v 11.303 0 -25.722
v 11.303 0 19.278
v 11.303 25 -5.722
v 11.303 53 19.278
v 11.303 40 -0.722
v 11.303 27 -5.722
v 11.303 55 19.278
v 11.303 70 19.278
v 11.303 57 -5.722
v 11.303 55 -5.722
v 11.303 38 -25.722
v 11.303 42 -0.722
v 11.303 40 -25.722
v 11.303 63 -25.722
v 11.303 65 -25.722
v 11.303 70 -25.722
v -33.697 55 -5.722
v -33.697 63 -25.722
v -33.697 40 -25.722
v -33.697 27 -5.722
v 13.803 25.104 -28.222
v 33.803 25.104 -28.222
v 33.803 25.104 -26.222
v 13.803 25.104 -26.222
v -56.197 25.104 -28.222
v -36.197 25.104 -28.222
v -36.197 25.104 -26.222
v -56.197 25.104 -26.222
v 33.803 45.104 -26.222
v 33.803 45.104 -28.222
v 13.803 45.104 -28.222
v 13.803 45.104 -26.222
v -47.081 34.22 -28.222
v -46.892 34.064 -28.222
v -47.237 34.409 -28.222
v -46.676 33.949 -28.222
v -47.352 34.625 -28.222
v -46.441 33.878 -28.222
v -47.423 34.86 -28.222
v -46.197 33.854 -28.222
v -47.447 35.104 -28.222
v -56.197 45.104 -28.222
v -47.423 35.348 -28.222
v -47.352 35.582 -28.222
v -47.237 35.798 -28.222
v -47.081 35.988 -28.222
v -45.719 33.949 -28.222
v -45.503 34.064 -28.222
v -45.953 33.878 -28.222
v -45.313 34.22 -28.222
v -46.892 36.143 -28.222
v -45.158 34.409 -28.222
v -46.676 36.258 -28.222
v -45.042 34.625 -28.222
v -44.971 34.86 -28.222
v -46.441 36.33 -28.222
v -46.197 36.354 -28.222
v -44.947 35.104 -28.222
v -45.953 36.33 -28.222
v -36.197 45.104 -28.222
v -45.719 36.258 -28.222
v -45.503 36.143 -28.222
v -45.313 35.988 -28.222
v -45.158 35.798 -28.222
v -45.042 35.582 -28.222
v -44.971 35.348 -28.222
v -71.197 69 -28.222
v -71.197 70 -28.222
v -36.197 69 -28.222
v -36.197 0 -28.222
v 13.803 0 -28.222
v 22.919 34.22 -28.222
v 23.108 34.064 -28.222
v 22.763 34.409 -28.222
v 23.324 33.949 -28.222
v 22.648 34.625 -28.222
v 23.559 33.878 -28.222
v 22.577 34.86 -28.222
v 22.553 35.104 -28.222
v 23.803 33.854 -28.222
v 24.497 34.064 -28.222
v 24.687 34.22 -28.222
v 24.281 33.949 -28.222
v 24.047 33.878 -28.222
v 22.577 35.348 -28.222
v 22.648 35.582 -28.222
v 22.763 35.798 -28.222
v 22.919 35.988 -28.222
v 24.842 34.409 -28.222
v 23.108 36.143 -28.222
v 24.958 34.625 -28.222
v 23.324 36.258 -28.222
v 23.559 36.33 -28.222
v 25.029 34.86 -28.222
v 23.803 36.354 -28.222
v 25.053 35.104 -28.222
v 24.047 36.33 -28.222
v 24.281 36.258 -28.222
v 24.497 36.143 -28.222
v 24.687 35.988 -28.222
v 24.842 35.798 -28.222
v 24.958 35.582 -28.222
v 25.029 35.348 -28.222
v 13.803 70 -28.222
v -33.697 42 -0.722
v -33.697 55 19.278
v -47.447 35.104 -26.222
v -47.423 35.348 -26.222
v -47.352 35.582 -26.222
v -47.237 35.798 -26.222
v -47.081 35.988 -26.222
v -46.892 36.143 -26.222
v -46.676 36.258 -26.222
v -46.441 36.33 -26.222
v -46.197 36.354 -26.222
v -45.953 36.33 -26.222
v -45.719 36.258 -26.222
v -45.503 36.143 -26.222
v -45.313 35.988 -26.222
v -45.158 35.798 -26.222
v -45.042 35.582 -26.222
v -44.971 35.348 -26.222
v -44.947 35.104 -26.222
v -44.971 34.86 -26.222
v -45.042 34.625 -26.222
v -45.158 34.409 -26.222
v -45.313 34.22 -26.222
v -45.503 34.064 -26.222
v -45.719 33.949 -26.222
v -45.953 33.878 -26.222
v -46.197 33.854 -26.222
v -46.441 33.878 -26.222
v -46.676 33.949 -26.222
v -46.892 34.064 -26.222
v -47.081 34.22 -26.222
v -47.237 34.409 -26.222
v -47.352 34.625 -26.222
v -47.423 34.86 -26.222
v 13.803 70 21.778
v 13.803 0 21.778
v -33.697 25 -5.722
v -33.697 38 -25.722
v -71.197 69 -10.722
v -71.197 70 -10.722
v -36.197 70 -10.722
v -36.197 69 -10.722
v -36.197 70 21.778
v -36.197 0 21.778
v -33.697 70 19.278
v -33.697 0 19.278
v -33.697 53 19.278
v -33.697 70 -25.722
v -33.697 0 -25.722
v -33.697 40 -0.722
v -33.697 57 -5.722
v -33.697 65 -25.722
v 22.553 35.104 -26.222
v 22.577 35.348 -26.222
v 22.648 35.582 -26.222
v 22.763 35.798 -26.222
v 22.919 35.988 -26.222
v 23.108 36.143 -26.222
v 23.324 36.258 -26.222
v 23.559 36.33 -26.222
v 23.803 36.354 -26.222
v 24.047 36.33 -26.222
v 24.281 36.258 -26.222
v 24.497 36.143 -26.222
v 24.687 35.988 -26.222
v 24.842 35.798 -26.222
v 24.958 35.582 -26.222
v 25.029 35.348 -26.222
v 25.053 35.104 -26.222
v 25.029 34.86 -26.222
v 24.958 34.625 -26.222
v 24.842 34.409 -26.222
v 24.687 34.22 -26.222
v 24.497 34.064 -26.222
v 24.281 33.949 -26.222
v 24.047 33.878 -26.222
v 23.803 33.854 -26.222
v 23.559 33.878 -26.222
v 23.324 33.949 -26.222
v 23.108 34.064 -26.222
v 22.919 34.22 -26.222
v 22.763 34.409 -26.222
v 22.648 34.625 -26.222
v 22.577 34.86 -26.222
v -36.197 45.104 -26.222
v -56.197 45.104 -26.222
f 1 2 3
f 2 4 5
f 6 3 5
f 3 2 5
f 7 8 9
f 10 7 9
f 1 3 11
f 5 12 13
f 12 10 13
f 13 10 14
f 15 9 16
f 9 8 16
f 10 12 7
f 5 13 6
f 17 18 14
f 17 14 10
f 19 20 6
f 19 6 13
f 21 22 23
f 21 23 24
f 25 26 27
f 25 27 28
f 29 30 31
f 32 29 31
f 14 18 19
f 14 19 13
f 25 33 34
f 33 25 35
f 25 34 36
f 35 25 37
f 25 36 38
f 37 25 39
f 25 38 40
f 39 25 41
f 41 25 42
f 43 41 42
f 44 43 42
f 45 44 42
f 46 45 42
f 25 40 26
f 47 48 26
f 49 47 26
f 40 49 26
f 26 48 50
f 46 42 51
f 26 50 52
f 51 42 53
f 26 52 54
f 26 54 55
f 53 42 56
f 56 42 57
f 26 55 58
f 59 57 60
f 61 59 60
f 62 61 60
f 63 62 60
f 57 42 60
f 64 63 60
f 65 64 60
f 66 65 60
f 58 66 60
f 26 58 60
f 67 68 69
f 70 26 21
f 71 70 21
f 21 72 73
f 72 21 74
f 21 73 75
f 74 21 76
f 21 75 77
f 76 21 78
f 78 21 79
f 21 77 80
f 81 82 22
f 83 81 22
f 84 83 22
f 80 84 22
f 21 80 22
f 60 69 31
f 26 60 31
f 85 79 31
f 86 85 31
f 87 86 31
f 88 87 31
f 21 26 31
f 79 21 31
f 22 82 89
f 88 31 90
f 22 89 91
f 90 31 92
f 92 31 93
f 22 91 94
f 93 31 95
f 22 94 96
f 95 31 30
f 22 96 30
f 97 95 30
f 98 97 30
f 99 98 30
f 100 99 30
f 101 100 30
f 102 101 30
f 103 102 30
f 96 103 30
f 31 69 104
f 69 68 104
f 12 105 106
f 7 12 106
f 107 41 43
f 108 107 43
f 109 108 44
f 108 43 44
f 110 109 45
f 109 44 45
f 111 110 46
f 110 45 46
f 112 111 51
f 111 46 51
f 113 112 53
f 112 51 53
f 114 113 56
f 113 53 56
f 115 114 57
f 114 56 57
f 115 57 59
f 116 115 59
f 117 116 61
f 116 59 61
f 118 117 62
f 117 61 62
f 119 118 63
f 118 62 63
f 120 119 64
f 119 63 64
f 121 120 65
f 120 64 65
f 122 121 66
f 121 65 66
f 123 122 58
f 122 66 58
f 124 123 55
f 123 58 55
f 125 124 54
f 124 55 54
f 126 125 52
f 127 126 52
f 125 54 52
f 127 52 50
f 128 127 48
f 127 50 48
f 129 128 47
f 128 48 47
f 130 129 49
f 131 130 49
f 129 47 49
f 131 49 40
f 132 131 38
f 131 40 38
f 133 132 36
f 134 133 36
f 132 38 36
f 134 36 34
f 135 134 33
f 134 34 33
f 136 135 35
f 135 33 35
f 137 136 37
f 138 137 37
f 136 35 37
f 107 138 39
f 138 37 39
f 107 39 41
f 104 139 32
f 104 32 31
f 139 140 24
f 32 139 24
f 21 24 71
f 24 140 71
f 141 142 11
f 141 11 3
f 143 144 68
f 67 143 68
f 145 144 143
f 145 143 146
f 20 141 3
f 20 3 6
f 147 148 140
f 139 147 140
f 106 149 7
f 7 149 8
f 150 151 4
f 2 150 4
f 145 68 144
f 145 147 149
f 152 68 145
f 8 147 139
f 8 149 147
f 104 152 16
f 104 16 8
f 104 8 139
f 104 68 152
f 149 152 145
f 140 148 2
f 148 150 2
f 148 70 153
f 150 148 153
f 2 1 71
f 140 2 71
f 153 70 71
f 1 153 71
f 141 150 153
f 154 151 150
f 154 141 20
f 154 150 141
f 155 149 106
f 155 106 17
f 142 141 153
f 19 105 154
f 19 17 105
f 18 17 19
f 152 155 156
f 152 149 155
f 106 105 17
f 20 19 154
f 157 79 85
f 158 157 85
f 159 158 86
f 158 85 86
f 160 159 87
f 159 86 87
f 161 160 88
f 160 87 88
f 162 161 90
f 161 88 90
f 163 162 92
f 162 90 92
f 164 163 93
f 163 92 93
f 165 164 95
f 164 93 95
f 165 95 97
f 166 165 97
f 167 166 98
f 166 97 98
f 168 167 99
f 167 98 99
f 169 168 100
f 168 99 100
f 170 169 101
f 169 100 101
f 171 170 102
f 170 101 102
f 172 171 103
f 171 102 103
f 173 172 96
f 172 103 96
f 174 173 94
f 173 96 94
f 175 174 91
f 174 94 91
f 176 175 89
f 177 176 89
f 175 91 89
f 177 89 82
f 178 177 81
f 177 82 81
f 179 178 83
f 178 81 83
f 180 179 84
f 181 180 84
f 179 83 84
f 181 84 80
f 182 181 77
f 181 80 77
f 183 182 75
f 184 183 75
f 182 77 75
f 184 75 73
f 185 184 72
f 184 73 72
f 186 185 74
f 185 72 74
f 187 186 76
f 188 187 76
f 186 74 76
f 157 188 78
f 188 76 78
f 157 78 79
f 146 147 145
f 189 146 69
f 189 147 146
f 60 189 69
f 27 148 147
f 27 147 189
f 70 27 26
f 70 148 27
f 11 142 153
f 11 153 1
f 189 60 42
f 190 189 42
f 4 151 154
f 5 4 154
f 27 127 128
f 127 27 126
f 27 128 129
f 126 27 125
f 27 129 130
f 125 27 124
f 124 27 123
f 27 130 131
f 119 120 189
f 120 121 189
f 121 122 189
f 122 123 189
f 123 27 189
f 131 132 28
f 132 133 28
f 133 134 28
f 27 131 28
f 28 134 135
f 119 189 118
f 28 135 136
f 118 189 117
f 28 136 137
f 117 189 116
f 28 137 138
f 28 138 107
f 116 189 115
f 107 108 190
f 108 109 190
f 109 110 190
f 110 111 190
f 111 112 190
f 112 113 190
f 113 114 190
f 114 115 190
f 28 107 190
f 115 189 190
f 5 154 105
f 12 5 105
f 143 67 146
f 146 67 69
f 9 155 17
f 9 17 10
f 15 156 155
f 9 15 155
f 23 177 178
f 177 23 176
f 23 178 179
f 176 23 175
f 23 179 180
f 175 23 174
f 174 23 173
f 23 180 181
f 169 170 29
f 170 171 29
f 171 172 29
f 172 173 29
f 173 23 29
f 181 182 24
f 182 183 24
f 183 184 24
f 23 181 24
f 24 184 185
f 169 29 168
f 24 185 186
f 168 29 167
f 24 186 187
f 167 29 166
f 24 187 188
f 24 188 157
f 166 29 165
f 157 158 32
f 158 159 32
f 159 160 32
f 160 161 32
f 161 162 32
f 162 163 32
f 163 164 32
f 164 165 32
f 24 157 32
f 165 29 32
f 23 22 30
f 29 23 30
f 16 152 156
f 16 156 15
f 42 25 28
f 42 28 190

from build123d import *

# Parameters (mm, degrees)
CROQUIS2_W              = 50
CROQUIS2_H              = 50
SALIENTE_EXTRUIR1_DEPTH = 70
CROQUIS3_W              = 45
CROQUIS3_H              = 45
CORTAR_EXTRUIR1_DEPTH   = 130
CROQUIS4_W              = 45
CROQUIS4_H              = 10
SALIENTE_EXTRUIR2_DEPTH = 20
CORTAR_EXTRUIR2_DEPTH   = 45
CROQUIS7_W              = 20
CROQUIS7_H              = 15
SALIENTE_EXTRUIR3_DEPTH = 45
CORTAR_EXTRUIR3_DEPTH   = 45
CROQUIS9_W              = 20
CROQUIS9_H              = 15
SALIENTE_EXTRUIR4_DEPTH = 45
CORTAR_EXTRUIR4_DEPTH   = 45
CROQUIS16_W             = 35
CROQUIS16_H             = 17.5
SALIENTE_EXTRUIR7_DEPTH = 1
CROQUIS17_W             = 20
CROQUIS17_H             = 20
CROQUIS17_R             = 1.25
SALIENTE_EXTRUIR8_DEPTH = 2


with BuildPart() as part:
    # Croquis2 → Saliente-Extruir1 (new body)
    with BuildSketch(Plane(origin=(0, 0, 0), x_dir=(1, 0, 0), z_dir=(0, 1, 0))):
        with Locations((-11.197183099, 3.221830986)):
            Rectangle(CROQUIS2_W, CROQUIS2_H)
    extrude(amount=SALIENTE_EXTRUIR1_DEPTH)

    # Croquis3 → Cortar-Extruir1 (cut)
    with BuildSketch(Plane(origin=(0, 70, 0), x_dir=(1, 0, 0), z_dir=(0, 1, 0))):
        with Locations((-11.197183099, 3.221830986)):
            Rectangle(CROQUIS3_W, CROQUIS3_H)
    extrude(amount=-CORTAR_EXTRUIR1_DEPTH, mode=Mode.SUBTRACT)

    # Croquis4 → Saliente-Extruir2 (add)
    with BuildSketch(Plane.XY.offset(-25.721830986)):
        with Locations((-11.197183099, 60)):
            Rectangle(CROQUIS4_W, CROQUIS4_H)
    extrude(amount=SALIENTE_EXTRUIR2_DEPTH)

    # Croquis5 → Cortar-Extruir2 (cut)
    with BuildSketch(Plane(origin=(-33.697183099, 0, 0), x_dir=(0, 0, -1), z_dir=(1, 0, 0))):
        Polygon((5.721830986, 65), (25.721830986, 65), (5.721830986, 57), align=None)
        Polygon((25.721830986, 55), (25.721830986, 63), (5.721830986, 55), align=None)
    extrude(amount=CORTAR_EXTRUIR2_DEPTH, mode=Mode.SUBTRACT)

    # Croquis7 → Saliente-Extruir3 (add)
    with BuildSketch(Plane(origin=(-33.697183099, 0, 0), x_dir=(0, 0, -1), z_dir=(1, 0, 0))):
        with Locations((-9.278169014, 47.5)):
            Rectangle(CROQUIS7_W, CROQUIS7_H)
    extrude(amount=SALIENTE_EXTRUIR3_DEPTH)

    # Croquis8 → Cortar-Extruir3 (cut)
    with BuildSketch(Plane(origin=(-33.697183099, 0, 0), x_dir=(0, 0, -1), z_dir=(1, 0, 0))):
        Polygon((0.721830986, 55), (0.721830986, 42), (-19.278169014, 55), align=None)
        Polygon((0.721830986, 40), (-19.278169014, 40), (-19.278169014, 53), align=None)
    extrude(amount=CORTAR_EXTRUIR3_DEPTH, mode=Mode.SUBTRACT)

    # Croquis9 → Saliente-Extruir4 (add)
    with BuildSketch(Plane(origin=(-33.697183099, 0, 0), x_dir=(0, 0, -1), z_dir=(1, 0, 0))):
        with Locations((15.721830986, 32.5)):
            Rectangle(CROQUIS9_W, CROQUIS9_H)
    extrude(amount=SALIENTE_EXTRUIR4_DEPTH)

    # Croquis10 → Cortar-Extruir4 (cut)
    with BuildSketch(Plane(origin=(-33.697183099, 0, 0), x_dir=(0, 0, -1), z_dir=(1, 0, 0))):
        Polygon((5.721830986, 40), (5.721830986, 27), (25.721830986, 40), align=None)
        Polygon((5.721830986, 25), (25.721830986, 25), (25.721830986, 38), align=None)
    extrude(amount=CORTAR_EXTRUIR4_DEPTH, mode=Mode.SUBTRACT)

    # Croquis16 → Saliente-Extruir7 (add)
    with BuildSketch(Plane(origin=(0, 70, 0), x_dir=(1, 0, 0), z_dir=(0, 1, 0))):
        with Locations((-53.697183099, 19.471830986)):
            Rectangle(CROQUIS16_W, CROQUIS16_H)
    extrude(amount=-SALIENTE_EXTRUIR7_DEPTH)

    # Croquis17 → Saliente-Extruir8 (add)
    # profile 1 of 2: a face of its own
    with BuildSketch(Plane(origin=(0, 0, -28.221830986), x_dir=(-1, 0, 0), z_dir=(0, 0, -1))):
        with Locations((-23.802816901, 35.103644725)):
            Rectangle(CROQUIS17_W, CROQUIS17_H)
        with Locations((-23.802816901, 35.103644725)):
            Circle(CROQUIS17_R, mode=Mode.SUBTRACT)
    # profile 2 of 2: a face of its own
    with BuildSketch(Plane(origin=(0, 0, -28.221830986), x_dir=(-1, 0, 0), z_dir=(0, 0, -1))):
        with Locations((46.197183099, 35.103644725)):
            Rectangle(CROQUIS17_W, CROQUIS17_H)
        with Locations((46.197183099, 35.103644725)):
            Circle(CROQUIS17_R, mode=Mode.SUBTRACT)
    extrude(amount=-SALIENTE_EXTRUIR8_DEPTH)


solid = part.part
